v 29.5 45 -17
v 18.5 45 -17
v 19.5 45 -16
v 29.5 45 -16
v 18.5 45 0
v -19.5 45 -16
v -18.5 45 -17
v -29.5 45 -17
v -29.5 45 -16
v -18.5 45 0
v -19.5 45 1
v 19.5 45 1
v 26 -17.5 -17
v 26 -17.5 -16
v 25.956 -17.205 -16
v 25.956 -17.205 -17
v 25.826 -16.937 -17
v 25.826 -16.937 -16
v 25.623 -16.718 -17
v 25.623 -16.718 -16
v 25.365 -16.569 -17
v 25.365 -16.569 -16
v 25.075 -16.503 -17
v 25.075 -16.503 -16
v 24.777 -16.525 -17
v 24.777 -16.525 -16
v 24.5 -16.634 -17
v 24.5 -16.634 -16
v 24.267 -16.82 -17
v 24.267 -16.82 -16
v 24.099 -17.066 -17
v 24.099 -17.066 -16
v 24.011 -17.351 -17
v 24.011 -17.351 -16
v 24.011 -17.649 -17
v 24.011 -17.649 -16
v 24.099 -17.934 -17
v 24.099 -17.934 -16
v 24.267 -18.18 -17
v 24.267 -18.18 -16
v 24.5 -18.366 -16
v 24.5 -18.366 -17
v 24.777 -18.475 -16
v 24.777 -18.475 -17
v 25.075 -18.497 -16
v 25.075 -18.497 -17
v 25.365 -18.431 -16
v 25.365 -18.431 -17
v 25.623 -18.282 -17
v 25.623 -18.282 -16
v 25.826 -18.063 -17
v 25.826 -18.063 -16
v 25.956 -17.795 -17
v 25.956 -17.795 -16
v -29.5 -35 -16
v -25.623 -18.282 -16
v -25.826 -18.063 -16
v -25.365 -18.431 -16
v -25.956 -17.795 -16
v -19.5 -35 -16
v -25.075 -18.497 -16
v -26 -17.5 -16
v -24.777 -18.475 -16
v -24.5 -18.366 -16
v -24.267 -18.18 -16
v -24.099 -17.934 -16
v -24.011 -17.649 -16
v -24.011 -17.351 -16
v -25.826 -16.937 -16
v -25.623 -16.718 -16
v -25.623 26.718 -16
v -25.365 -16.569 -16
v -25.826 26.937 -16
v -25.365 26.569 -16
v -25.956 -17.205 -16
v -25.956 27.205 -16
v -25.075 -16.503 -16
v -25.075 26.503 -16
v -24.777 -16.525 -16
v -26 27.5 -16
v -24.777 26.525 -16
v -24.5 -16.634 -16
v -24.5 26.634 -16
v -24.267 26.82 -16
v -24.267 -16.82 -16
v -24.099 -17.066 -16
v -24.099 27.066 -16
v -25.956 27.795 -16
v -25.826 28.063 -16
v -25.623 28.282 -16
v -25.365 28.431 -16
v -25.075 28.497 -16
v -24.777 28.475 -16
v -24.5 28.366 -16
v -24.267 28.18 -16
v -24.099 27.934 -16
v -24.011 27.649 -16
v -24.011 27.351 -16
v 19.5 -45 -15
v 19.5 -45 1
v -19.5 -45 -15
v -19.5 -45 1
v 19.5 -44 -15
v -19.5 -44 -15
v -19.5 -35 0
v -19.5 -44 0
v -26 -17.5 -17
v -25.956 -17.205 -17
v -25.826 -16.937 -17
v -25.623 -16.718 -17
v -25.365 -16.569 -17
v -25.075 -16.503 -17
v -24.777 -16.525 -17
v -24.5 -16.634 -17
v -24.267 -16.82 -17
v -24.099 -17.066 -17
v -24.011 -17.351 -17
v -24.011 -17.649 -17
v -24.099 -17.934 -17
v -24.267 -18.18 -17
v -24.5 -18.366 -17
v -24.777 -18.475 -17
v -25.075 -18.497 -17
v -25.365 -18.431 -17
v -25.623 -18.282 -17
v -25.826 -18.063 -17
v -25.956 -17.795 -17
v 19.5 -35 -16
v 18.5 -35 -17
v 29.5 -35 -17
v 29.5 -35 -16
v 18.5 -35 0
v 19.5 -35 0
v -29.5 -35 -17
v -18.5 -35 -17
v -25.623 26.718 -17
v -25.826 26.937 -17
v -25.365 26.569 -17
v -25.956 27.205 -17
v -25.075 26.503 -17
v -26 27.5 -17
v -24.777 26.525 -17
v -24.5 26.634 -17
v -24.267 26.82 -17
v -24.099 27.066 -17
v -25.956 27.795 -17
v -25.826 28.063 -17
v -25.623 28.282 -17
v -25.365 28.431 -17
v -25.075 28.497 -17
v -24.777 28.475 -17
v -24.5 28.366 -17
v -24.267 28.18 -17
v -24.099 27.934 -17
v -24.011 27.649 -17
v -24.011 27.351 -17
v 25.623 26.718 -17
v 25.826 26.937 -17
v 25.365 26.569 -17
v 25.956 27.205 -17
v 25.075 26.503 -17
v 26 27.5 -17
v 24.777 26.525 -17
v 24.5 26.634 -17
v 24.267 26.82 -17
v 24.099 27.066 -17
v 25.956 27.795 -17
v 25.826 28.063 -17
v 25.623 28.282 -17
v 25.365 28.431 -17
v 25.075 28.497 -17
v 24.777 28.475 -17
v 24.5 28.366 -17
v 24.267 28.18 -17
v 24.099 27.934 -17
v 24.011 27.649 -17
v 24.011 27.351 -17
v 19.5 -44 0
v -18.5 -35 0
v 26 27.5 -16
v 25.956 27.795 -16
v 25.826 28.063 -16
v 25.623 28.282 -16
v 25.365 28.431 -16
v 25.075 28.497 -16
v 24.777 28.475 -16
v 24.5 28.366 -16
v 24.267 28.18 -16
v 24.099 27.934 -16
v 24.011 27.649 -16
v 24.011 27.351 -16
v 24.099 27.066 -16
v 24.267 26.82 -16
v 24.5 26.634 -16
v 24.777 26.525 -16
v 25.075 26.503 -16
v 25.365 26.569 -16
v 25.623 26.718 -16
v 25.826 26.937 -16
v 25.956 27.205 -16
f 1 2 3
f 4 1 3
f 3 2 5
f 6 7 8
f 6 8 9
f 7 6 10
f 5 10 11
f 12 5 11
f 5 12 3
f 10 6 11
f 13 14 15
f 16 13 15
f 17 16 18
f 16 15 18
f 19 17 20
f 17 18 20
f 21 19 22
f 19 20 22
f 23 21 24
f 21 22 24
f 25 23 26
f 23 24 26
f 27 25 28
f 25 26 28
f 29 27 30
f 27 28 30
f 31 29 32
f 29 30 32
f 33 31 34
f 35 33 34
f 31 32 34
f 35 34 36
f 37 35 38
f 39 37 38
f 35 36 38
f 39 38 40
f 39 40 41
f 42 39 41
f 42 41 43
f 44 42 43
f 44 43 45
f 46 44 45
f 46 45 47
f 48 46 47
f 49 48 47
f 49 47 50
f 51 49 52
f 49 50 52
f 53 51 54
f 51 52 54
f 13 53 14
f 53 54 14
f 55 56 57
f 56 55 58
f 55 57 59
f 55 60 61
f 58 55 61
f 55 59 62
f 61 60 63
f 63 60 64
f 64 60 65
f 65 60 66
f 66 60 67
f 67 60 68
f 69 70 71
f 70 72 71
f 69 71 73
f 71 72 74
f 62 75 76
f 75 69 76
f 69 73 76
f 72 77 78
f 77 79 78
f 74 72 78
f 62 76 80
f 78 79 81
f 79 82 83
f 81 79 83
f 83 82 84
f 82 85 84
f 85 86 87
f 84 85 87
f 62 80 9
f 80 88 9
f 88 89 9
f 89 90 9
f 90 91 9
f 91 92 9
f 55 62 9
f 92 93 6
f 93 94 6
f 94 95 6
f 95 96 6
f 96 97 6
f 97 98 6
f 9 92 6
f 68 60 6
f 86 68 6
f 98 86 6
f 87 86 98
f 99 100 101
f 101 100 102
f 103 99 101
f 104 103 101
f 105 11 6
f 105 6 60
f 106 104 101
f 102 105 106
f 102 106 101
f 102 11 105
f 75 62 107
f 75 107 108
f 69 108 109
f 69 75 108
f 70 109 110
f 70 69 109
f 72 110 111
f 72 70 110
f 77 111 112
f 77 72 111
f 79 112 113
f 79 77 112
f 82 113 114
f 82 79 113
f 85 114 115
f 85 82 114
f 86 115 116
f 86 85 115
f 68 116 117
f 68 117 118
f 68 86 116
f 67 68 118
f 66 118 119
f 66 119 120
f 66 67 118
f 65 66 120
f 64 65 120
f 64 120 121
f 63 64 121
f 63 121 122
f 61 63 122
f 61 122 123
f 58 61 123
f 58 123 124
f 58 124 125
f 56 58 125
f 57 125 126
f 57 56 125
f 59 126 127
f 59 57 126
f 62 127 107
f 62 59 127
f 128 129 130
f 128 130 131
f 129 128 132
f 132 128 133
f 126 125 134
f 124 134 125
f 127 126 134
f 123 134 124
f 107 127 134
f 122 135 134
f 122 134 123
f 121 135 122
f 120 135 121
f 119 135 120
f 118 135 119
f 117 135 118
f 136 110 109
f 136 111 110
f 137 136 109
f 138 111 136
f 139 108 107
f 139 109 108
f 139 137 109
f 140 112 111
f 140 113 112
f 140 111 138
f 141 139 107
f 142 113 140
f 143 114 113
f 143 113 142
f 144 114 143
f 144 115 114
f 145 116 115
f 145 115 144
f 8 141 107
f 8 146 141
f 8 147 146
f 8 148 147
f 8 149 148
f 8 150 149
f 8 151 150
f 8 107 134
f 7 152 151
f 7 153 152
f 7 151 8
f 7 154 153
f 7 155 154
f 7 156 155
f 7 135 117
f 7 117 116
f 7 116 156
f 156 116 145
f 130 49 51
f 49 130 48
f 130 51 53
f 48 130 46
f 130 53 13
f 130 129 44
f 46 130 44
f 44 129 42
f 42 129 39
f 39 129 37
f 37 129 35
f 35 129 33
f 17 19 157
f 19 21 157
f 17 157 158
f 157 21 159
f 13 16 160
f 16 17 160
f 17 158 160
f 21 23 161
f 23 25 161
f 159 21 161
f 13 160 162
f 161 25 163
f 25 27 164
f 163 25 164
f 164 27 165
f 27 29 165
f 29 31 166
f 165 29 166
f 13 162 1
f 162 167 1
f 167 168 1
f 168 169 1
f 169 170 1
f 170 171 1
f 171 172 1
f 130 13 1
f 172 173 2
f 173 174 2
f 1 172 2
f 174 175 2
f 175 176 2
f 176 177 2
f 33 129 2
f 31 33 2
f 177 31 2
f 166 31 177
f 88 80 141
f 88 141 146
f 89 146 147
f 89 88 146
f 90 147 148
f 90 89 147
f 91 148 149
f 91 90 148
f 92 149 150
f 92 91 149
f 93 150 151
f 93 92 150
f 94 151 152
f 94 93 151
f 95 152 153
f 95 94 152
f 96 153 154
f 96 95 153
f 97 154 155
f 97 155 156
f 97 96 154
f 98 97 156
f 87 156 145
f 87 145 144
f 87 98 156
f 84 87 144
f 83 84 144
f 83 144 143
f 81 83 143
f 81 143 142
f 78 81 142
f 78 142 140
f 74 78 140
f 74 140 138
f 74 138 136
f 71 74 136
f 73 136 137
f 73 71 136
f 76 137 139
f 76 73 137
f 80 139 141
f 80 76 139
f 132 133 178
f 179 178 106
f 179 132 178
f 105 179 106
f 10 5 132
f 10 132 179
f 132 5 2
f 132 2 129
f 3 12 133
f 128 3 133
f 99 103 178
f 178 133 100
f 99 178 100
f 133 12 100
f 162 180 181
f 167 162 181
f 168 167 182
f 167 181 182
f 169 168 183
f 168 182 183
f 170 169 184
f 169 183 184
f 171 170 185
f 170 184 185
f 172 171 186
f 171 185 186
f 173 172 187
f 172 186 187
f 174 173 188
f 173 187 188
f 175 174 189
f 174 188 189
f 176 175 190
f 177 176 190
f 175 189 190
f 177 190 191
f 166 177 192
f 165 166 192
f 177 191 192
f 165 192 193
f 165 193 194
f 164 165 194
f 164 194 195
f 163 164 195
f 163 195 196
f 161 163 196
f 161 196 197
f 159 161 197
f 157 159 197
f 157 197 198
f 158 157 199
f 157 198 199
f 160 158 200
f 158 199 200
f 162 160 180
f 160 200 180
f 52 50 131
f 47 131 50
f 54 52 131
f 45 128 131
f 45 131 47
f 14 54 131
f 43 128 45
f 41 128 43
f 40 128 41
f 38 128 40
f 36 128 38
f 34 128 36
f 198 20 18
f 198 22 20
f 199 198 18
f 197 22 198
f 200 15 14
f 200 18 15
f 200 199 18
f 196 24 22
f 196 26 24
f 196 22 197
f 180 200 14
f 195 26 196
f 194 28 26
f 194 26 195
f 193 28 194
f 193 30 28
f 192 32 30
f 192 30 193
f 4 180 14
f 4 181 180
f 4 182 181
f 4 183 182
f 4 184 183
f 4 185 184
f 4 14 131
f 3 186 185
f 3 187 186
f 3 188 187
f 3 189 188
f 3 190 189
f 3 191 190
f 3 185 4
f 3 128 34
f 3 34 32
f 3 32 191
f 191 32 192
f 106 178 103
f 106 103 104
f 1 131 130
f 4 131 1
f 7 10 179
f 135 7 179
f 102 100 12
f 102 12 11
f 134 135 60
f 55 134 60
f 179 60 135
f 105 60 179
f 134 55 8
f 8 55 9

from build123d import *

# Parameters (mm, degrees)
F0_W      = 39
F0_H      = 90
F1_DEPTH  = 1
F2_W      = 1
F2_H      = 90
F3_DEPTH  = 17
F4_W      = 90
F4_H      = 1
F5_DEPTH  = 10
F6_W      = 10
F6_H      = 18
F7_DEPTH  = 11
F8_W      = 38
F8_H      = 1
F9_DEPTH  = 15
F10_R     = 1
F11_DEPTH = 1


with BuildPart() as f1:
    # F0 (on Top) → F1 (new body)
    with BuildSketch(Plane.XY):
        Rectangle(F0_W, F0_H)
    extrude(amount=F1_DEPTH)

    # F2 (on face) → F3 (join)
    with BuildSketch(Plane(origin=(0, 0, 0), x_dir=(1, 0, 0), z_dir=(0, 0, -1))):
        with Locations((19, 0)):
            Rectangle(F2_W, F2_H)
    extrude(amount=F3_DEPTH)

    # F4 (on face) → F5 (join)
    with BuildSketch(Plane.YZ.offset(19.5)):
        with Locations((0, -16.5)):
            Rectangle(F4_W, F4_H)
    extrude(amount=F5_DEPTH)

    # F6 (on face) → F7 (cut, through all)
    with BuildSketch(Plane.YZ.offset(29.5)):
        with Locations((-40, -8)):
            Rectangle(F6_W, F6_H)
    extrude(amount=-F7_DEPTH, mode=Mode.SUBTRACT)

    # F8 (on face) → F9 (join)
    with BuildSketch(Plane(origin=(0, 0, 0), x_dir=(1, 0, 0), z_dir=(0, 0, -1))):
        with Locations((-0.5, 44.5)):
            Rectangle(F8_W, F8_H)
    extrude(amount=F9_DEPTH)

    # F10 (on face) → F11 (cut, through all)
    with BuildSketch(Plane.XY.offset(-16)):
        with Locations((25, 27.5)):
            Circle(F10_R)
        with Locations((25, -17.5)):
            Circle(F10_R)
    extrude(amount=-F11_DEPTH, mode=Mode.SUBTRACT)

    # F12: F1 across plane


with BuildPart() as f1_1:
    add(f1.part)
    add(f1.part.mirror(Plane.YZ))


solid = f1_1.part
